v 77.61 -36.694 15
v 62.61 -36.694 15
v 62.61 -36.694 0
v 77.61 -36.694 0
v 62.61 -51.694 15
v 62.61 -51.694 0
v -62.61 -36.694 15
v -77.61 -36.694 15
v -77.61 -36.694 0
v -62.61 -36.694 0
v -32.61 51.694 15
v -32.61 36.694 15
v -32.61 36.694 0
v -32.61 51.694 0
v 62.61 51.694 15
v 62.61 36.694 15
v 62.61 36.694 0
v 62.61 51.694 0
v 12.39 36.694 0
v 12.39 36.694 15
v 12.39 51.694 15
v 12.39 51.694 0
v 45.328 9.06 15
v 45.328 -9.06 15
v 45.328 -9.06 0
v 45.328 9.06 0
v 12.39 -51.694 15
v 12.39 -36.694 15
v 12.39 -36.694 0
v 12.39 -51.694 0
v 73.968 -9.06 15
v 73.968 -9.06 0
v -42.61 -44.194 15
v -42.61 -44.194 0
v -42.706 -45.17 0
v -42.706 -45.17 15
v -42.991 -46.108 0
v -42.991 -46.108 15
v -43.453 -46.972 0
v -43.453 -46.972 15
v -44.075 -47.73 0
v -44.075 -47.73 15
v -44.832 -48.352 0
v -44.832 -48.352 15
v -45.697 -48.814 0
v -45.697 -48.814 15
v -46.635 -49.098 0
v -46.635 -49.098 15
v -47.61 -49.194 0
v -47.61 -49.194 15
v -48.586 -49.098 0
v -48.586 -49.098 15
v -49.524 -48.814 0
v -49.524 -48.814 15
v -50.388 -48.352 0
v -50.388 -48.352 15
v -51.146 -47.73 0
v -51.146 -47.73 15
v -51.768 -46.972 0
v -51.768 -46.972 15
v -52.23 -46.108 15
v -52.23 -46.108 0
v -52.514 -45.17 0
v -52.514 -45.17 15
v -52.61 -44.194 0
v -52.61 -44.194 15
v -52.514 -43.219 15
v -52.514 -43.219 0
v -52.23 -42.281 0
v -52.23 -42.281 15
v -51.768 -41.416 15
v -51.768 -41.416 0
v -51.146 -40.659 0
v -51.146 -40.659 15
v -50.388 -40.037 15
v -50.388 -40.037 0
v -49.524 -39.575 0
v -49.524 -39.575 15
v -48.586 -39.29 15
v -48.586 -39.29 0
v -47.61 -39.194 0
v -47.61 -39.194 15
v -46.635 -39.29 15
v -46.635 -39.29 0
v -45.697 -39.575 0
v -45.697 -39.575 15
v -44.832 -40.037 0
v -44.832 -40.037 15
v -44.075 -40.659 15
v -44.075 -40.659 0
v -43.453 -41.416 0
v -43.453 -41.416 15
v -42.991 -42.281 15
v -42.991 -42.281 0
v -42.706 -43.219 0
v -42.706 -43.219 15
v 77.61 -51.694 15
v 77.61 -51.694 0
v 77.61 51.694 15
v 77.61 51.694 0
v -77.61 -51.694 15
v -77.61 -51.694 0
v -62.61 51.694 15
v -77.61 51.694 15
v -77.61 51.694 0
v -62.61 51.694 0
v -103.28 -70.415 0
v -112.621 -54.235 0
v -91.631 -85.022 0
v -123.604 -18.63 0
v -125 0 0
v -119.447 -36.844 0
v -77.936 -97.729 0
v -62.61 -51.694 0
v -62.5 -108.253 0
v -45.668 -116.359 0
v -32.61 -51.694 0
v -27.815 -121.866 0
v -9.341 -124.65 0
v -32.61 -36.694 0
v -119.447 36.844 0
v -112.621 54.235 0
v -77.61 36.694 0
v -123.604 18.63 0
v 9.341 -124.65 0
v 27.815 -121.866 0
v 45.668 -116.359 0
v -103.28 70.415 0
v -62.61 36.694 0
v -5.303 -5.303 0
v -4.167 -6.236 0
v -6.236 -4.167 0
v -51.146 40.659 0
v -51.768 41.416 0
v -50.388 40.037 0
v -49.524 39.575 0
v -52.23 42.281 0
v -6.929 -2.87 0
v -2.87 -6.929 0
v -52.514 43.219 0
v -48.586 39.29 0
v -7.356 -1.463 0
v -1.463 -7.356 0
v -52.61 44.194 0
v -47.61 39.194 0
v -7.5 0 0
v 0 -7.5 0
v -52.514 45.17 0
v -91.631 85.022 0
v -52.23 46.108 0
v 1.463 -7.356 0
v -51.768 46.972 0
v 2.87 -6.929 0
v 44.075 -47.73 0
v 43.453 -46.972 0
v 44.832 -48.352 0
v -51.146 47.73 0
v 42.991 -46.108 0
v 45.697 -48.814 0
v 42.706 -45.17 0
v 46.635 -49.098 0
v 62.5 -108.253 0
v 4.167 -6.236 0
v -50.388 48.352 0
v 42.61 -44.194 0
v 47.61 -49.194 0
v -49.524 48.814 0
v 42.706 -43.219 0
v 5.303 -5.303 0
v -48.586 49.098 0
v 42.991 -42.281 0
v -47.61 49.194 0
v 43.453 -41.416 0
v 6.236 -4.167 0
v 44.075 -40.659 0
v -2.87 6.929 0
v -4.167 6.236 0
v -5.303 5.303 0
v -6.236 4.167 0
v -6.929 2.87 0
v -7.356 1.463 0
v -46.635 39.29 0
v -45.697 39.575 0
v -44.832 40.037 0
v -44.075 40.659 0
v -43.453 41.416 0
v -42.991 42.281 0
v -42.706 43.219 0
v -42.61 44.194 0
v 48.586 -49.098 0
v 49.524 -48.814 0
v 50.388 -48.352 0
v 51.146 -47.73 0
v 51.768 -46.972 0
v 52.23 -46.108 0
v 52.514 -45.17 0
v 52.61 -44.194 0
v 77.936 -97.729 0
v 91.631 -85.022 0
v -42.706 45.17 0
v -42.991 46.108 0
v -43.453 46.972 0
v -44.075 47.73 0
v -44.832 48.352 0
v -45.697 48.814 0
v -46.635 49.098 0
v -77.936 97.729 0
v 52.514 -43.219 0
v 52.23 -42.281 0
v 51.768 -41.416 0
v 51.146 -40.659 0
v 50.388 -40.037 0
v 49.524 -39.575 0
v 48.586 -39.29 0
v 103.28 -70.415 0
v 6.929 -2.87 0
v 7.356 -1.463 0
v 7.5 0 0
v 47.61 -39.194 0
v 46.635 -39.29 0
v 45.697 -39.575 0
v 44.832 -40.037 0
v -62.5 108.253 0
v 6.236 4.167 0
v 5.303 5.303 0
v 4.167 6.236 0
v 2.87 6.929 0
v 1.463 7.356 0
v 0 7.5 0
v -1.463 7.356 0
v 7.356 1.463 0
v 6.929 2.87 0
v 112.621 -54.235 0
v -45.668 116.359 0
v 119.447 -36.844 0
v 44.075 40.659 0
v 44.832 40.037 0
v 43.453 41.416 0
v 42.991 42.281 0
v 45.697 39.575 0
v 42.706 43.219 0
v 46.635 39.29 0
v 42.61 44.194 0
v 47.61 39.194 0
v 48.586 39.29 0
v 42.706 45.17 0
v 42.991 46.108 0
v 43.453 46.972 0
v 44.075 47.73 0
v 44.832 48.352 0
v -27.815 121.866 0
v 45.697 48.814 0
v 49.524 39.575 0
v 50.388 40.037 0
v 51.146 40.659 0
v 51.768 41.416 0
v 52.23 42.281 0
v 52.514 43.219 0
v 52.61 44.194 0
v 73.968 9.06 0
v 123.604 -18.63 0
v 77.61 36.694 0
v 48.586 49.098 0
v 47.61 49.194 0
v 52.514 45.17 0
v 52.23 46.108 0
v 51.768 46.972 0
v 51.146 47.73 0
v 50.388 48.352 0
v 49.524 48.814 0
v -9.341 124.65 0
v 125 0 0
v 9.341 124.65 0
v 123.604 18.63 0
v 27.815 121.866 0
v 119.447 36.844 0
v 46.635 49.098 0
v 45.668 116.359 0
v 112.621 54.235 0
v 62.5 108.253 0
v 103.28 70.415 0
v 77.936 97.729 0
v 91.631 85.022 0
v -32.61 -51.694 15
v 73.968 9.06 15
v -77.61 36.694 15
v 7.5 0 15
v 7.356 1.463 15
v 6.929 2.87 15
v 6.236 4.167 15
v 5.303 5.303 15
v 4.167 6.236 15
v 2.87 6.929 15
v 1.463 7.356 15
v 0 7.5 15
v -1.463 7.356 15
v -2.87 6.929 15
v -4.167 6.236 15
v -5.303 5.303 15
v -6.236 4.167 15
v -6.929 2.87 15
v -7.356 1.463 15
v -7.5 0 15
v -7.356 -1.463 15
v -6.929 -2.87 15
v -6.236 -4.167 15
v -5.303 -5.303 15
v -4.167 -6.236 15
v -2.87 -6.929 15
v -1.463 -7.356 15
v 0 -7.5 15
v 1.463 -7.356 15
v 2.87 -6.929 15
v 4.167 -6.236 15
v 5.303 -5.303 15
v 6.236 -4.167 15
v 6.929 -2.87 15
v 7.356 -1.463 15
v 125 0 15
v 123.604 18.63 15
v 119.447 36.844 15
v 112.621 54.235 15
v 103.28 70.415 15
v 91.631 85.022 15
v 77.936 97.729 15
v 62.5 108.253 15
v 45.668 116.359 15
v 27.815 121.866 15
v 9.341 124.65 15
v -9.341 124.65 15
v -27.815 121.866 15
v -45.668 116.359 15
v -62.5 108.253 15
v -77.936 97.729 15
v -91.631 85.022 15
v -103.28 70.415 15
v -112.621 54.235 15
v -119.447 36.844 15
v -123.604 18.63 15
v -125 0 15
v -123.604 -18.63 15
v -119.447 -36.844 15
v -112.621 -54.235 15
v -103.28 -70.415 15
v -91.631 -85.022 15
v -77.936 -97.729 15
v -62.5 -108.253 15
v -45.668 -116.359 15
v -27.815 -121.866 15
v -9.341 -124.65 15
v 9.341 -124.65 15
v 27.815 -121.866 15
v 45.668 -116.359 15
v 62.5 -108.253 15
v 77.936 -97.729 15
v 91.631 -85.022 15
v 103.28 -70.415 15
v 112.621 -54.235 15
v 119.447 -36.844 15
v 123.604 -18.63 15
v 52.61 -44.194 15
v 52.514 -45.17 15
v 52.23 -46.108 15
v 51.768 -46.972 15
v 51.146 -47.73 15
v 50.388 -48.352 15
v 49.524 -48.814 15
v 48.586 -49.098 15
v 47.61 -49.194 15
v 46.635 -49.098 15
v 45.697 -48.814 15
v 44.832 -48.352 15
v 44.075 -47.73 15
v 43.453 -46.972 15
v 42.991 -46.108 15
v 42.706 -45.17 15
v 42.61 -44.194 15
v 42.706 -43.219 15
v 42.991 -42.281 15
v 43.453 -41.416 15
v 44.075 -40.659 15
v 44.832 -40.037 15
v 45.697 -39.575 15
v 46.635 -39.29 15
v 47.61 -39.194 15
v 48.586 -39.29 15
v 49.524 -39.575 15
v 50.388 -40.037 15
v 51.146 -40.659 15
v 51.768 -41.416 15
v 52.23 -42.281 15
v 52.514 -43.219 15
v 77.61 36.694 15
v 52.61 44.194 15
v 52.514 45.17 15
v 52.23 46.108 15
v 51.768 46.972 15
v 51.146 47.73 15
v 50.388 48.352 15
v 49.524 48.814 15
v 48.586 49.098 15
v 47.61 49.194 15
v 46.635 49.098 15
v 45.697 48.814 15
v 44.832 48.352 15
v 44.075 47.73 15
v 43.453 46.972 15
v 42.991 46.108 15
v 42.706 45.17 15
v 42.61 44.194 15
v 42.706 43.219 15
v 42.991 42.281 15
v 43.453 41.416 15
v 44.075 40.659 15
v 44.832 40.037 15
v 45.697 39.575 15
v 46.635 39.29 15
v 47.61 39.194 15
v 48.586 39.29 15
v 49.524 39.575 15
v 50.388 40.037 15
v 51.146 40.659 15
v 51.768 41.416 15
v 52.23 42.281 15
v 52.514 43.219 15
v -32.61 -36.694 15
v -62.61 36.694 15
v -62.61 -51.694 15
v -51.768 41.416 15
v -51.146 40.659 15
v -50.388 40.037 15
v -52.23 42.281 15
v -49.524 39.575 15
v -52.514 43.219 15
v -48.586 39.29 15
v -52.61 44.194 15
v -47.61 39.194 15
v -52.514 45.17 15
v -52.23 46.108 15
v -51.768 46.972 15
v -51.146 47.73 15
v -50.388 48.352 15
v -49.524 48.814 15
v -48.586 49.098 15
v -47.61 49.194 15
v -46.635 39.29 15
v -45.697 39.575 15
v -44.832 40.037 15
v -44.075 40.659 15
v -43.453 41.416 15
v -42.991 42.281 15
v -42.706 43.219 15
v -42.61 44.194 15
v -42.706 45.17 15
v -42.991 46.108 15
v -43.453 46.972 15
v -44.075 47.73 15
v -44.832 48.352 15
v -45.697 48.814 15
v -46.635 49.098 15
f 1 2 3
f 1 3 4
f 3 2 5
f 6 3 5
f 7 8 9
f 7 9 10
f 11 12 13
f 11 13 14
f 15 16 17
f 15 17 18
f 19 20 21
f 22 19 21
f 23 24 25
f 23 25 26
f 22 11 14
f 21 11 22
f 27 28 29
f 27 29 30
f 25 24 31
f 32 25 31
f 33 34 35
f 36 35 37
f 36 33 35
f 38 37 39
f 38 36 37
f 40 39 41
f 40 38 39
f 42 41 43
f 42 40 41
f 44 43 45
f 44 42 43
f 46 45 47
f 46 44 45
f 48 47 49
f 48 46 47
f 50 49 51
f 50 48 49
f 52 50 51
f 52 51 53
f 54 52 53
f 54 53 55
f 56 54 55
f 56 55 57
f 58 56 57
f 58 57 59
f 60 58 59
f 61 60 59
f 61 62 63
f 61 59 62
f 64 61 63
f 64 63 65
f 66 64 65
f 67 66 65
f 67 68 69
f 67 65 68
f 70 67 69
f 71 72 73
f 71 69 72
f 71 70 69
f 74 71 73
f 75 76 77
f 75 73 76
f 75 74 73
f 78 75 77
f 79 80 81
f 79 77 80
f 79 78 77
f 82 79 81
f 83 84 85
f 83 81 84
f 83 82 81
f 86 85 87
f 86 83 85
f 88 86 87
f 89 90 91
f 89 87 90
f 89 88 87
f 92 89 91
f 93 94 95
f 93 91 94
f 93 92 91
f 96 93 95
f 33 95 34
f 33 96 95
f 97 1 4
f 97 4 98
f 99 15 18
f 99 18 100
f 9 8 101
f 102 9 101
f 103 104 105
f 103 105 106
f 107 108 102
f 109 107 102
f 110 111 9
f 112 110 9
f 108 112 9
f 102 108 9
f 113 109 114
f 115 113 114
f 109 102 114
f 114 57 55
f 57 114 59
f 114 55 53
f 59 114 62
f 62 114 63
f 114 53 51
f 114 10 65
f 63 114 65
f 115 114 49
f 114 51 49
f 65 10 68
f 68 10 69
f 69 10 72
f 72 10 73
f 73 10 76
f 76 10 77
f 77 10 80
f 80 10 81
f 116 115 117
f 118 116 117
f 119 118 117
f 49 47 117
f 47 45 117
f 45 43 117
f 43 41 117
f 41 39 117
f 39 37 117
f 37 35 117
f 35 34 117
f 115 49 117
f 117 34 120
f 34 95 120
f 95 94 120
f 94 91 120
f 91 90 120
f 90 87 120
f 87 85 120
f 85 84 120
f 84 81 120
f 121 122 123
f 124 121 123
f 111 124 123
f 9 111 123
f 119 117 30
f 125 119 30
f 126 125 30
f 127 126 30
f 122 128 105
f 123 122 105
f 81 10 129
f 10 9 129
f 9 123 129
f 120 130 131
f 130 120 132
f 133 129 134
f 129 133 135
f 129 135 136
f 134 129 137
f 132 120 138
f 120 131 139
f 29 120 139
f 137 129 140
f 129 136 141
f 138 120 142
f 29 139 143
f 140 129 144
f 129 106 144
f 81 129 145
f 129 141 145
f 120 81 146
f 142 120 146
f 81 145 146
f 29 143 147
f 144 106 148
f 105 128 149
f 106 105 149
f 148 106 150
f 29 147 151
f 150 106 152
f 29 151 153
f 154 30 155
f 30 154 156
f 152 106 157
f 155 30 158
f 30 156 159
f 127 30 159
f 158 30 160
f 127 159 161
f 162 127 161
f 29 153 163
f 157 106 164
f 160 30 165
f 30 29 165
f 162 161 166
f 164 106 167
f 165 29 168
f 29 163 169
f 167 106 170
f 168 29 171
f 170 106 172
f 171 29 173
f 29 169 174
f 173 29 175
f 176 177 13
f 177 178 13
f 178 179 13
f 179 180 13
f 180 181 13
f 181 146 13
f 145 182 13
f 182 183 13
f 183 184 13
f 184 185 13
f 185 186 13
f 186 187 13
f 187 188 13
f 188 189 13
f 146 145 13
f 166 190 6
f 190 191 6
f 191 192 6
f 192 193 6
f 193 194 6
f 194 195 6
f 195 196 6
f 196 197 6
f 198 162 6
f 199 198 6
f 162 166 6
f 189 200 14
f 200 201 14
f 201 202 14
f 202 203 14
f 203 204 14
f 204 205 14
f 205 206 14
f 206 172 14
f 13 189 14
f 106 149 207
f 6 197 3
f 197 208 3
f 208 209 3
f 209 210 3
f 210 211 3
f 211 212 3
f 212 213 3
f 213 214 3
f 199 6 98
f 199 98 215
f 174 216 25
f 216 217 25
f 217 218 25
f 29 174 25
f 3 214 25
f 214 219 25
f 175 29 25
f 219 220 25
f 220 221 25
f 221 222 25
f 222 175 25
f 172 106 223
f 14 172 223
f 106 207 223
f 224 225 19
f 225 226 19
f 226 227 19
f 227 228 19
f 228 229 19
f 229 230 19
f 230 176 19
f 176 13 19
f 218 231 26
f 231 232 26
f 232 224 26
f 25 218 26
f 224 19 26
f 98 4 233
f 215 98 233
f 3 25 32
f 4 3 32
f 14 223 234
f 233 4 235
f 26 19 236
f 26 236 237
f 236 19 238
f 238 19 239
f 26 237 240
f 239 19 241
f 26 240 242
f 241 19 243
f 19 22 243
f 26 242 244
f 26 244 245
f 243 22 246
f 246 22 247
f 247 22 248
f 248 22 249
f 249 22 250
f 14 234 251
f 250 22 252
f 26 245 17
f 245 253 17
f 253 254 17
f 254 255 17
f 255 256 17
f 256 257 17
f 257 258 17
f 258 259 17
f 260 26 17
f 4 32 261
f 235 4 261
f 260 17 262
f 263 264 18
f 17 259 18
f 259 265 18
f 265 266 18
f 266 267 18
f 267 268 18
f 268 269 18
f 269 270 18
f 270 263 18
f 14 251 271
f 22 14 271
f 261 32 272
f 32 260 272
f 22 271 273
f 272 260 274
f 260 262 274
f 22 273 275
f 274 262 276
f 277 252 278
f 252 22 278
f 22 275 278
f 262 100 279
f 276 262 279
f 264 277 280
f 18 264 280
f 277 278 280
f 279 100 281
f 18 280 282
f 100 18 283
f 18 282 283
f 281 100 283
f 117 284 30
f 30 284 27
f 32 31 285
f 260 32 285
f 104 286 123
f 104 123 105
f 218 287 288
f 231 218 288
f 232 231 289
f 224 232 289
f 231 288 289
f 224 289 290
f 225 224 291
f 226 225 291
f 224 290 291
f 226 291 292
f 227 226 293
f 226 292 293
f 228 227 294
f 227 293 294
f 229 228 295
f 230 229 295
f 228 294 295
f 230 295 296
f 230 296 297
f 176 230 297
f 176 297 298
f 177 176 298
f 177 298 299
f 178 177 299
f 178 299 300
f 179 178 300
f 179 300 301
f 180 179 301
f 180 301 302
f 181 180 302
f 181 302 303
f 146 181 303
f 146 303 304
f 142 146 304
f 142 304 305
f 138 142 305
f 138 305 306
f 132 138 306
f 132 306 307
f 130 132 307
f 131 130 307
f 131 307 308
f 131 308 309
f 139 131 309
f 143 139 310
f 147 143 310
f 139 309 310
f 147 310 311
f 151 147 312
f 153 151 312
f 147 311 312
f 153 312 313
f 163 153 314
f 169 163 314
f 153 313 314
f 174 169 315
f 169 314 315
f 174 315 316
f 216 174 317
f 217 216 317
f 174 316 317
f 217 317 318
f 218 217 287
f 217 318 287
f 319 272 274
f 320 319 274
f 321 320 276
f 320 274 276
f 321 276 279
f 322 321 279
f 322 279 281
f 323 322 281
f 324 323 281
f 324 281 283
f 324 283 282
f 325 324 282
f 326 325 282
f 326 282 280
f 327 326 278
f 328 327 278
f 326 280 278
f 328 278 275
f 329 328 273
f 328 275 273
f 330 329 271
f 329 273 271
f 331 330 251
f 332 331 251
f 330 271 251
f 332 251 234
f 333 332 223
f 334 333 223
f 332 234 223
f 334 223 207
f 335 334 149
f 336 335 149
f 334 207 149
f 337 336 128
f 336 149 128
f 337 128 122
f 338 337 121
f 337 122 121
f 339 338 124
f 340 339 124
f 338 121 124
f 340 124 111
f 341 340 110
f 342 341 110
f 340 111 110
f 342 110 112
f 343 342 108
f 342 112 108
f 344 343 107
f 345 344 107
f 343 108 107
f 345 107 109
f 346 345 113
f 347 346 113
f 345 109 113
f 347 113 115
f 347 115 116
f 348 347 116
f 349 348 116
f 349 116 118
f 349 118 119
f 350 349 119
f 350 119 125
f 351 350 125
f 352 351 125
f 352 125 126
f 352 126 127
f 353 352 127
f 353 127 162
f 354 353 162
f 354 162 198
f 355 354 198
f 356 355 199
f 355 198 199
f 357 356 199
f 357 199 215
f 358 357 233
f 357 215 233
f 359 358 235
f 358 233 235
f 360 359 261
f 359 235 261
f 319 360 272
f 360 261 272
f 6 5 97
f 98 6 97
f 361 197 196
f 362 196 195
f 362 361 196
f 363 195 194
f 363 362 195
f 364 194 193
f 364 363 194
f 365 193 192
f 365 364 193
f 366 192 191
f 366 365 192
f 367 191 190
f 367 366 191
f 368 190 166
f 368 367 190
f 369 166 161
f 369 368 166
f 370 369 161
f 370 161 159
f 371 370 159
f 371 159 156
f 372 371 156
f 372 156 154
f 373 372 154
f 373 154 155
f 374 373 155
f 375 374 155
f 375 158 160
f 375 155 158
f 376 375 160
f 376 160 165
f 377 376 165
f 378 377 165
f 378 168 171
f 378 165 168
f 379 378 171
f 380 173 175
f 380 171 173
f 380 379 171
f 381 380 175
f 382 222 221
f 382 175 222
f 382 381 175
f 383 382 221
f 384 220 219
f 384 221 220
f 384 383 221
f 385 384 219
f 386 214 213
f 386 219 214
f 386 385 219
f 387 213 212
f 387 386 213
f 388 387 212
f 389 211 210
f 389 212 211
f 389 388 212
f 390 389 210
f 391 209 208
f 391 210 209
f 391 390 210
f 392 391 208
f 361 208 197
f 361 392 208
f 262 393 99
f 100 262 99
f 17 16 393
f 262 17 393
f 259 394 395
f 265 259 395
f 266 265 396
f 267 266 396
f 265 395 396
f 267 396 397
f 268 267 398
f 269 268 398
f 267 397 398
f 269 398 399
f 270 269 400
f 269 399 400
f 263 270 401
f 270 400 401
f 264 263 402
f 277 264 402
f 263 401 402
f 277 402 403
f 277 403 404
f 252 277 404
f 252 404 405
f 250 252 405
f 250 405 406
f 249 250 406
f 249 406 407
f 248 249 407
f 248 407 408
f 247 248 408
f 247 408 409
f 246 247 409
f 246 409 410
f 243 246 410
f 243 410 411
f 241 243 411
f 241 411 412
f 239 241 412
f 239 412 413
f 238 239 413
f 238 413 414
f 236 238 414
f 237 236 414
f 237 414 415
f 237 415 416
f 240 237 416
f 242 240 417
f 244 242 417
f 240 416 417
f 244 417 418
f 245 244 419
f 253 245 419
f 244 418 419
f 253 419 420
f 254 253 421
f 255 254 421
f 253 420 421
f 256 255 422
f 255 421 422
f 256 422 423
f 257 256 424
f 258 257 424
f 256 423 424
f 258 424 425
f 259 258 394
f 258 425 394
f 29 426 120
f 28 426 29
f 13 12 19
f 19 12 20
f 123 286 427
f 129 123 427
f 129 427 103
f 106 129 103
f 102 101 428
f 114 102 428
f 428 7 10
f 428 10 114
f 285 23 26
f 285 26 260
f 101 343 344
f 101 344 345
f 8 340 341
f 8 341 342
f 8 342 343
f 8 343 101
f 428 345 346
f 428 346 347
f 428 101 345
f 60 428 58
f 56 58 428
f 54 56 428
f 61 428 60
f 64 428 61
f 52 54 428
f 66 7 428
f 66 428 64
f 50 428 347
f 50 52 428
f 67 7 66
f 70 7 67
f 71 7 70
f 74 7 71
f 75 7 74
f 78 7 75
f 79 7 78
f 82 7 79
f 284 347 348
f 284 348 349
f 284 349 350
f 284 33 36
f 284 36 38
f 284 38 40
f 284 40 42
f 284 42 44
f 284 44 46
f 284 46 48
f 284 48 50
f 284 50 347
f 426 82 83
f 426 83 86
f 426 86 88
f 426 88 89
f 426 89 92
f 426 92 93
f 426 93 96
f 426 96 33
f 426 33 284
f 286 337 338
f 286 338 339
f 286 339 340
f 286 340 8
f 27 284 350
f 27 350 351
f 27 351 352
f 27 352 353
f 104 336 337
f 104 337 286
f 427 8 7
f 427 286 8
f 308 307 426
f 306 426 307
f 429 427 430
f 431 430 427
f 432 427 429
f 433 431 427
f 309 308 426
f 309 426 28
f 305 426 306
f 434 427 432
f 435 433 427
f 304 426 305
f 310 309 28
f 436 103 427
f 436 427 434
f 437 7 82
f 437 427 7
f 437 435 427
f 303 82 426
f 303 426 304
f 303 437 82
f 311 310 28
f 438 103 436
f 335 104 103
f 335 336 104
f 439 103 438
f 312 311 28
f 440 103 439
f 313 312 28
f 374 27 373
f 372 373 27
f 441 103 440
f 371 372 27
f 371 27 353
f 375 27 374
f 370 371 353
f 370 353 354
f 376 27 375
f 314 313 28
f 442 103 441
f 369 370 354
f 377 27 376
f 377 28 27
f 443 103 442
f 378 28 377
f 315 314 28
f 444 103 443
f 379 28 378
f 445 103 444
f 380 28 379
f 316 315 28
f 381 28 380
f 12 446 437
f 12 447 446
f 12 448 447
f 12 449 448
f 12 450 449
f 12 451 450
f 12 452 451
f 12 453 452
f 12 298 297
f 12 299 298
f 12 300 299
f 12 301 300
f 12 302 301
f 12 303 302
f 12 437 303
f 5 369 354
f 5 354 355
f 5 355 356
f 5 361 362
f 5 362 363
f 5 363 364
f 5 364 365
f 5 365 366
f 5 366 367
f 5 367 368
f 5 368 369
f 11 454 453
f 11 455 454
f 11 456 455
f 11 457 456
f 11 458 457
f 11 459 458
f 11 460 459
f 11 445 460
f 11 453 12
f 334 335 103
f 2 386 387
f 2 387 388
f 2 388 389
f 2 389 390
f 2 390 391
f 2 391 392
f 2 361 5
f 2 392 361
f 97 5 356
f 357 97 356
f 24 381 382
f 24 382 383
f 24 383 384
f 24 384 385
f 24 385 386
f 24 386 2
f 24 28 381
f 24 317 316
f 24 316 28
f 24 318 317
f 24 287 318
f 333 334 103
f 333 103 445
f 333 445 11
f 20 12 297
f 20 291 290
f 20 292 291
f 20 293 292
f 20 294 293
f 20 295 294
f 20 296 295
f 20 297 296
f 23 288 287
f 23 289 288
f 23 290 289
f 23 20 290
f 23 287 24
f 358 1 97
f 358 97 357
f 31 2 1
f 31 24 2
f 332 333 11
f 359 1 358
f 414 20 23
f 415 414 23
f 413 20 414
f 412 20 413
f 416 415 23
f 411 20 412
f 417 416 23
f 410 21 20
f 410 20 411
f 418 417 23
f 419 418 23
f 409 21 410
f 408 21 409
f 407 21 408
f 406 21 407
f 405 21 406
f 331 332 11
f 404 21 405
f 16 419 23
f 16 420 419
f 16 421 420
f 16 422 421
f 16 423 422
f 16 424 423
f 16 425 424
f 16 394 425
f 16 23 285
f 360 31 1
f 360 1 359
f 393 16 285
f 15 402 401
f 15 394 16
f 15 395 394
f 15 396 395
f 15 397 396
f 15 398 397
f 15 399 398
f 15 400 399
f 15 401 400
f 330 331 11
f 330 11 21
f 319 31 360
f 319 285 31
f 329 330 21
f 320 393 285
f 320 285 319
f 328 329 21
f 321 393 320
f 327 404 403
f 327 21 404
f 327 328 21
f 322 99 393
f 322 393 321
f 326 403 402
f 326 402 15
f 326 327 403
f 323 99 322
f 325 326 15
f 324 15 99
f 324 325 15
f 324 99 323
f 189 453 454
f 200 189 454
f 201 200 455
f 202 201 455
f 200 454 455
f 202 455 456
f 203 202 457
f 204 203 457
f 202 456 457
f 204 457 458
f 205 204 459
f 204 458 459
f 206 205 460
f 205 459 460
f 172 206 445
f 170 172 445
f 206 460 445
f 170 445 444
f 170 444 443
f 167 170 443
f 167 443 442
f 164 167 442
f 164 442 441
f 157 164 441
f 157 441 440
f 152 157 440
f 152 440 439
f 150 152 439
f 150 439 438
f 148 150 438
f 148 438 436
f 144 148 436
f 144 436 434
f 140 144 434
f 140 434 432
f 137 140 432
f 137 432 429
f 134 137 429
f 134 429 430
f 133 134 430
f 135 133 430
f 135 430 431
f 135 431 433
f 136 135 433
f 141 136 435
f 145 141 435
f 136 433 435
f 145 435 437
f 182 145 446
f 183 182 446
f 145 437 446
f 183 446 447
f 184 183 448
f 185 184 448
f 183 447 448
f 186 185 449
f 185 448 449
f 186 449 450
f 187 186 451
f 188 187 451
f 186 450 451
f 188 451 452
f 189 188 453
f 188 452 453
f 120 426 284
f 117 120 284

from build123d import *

# Parameters (mm, degrees)
ESQUISSE1_R             = 125
BOSS_EXTRU_1_DEPTH      = 15
ESQUISSE2_R             = 7.5
ESQUISSE2_R_2           = 5
ESQUISSE2_W             = 15
ESQUISSE2_H             = 15
ESQUISSE2_W_2           = 28.64
ESQUISSE2_H_2           = 18.12
ESQUISSE2_W_3           = 45
ENL_V_MAT_EXTRU_1_DEPTH = 178.411949992


with BuildPart() as part:
    # Esquisse1 → Boss.-Extru.1 (new body)
    with BuildSketch(Plane.XY):
        Circle(ESQUISSE1_R)
    extrude(amount=BOSS_EXTRU_1_DEPTH)

    # Esquisse2 → Enlèv. mat.-Extru.1 (cut, through all)
    with BuildSketch(Plane.XY.offset(15)):
        Circle(ESQUISSE2_R)
        with Locations((47.610253526, 44.194173824)):
            Circle(ESQUISSE2_R_2)
        with Locations((-47.610253526, 44.194173824)):
            Circle(ESQUISSE2_R_2)
        with Locations((70.110253526, 44.194173824)):
            Rectangle(ESQUISSE2_W, ESQUISSE2_H)
        with Locations((-70.110253526, 44.194173824)):
            Rectangle(ESQUISSE2_W, ESQUISSE2_H)
        with Locations((59.648339804, 0)):
            Rectangle(ESQUISSE2_W_2, ESQUISSE2_H_2)
        with Locations((-10.110253526, 44.194173824)):
            Rectangle(ESQUISSE2_W_3, ESQUISSE2_H)
    enl_v_mat_extru_1 = extrude(amount=-ENL_V_MAT_EXTRU_1_DEPTH, mode=Mode.SUBTRACT)

    # Symétrie1: Enlèv. mat.-Extru.1 across plane
    add(enl_v_mat_extru_1.mirror(Plane.ZX), mode=Mode.SUBTRACT)


solid = part.part
